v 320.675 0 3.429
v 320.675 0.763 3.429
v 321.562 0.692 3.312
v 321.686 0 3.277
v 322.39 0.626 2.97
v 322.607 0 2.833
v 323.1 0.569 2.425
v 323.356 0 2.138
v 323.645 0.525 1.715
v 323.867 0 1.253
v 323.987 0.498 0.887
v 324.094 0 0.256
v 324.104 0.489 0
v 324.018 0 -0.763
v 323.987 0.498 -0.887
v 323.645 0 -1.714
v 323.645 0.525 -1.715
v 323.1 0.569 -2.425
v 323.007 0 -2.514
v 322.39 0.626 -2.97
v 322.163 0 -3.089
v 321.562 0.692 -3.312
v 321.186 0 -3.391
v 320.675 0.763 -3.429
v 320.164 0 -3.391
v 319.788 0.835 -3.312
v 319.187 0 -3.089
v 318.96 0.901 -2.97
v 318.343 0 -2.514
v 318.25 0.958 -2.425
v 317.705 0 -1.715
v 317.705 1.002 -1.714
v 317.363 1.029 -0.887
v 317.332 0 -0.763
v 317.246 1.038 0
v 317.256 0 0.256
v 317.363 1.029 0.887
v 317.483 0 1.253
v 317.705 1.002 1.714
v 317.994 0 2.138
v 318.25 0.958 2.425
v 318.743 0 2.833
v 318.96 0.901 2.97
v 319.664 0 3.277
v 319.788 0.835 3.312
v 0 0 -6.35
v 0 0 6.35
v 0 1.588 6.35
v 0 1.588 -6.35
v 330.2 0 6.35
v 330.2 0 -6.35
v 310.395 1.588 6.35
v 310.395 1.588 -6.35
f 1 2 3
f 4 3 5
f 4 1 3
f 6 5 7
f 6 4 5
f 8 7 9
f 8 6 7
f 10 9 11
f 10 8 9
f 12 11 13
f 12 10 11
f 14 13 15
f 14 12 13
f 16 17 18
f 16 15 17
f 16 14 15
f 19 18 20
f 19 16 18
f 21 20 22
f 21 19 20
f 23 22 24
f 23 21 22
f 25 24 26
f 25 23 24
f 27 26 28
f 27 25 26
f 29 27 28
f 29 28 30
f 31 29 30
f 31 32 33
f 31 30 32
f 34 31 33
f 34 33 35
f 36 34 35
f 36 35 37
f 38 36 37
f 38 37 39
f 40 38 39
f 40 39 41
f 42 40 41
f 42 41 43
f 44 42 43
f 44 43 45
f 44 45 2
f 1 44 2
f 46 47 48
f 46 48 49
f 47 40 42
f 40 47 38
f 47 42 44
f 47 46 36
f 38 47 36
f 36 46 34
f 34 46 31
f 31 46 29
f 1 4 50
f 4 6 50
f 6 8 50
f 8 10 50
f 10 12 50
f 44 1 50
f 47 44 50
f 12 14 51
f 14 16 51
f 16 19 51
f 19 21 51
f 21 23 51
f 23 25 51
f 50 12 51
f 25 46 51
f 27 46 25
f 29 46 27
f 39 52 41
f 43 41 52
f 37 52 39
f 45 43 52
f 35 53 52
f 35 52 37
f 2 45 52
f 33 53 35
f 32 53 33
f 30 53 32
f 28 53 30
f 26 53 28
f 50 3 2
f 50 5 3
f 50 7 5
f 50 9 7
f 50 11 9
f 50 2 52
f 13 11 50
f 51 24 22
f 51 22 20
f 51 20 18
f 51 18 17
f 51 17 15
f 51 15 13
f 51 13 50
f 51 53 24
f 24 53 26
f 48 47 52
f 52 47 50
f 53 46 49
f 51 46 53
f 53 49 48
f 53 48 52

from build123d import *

# Parameters (mm, degrees)
SKETCH1_W               = 330.2
SKETCH1_H               = 12.7
SKETCH1_R               = 3.429
EXTRUDE1_DEPTH          = 1.5875
CUT_EXTRUDE2_DEPTH      = 7.35
CUT_EXTRUDE2_DEPTH_BACK = 7.35


with BuildPart() as part:
    # Sketch1 → Extrude1 (new body)
    with BuildSketch(Plane(origin=(0, 0, 0), x_dir=(1, 0, 0), z_dir=(0, 1, 0))):
        with Locations((165.1, 0)):
            Rectangle(SKETCH1_W, SKETCH1_H)
        with Locations(Location((320.675, 0, 0), (0, 0, 270))):  # turned: the seam where the file's is
            Circle(SKETCH1_R, mode=Mode.SUBTRACT)
    extrude(amount=EXTRUDE1_DEPTH)

    # Sketch2 → Cut-Extrude2 (cut, two sides)
    with BuildSketch(Plane.XY) as cut_extrude2_sk:
        Polygon((330.2, 0), (330.2, 2.264018557), (301.954487886, 2.264018557), align=None)
    extrude(amount=CUT_EXTRUDE2_DEPTH, mode=Mode.SUBTRACT)
    extrude(cut_extrude2_sk.sketch, amount=-CUT_EXTRUDE2_DEPTH_BACK, mode=Mode.SUBTRACT)


solid = part.part
